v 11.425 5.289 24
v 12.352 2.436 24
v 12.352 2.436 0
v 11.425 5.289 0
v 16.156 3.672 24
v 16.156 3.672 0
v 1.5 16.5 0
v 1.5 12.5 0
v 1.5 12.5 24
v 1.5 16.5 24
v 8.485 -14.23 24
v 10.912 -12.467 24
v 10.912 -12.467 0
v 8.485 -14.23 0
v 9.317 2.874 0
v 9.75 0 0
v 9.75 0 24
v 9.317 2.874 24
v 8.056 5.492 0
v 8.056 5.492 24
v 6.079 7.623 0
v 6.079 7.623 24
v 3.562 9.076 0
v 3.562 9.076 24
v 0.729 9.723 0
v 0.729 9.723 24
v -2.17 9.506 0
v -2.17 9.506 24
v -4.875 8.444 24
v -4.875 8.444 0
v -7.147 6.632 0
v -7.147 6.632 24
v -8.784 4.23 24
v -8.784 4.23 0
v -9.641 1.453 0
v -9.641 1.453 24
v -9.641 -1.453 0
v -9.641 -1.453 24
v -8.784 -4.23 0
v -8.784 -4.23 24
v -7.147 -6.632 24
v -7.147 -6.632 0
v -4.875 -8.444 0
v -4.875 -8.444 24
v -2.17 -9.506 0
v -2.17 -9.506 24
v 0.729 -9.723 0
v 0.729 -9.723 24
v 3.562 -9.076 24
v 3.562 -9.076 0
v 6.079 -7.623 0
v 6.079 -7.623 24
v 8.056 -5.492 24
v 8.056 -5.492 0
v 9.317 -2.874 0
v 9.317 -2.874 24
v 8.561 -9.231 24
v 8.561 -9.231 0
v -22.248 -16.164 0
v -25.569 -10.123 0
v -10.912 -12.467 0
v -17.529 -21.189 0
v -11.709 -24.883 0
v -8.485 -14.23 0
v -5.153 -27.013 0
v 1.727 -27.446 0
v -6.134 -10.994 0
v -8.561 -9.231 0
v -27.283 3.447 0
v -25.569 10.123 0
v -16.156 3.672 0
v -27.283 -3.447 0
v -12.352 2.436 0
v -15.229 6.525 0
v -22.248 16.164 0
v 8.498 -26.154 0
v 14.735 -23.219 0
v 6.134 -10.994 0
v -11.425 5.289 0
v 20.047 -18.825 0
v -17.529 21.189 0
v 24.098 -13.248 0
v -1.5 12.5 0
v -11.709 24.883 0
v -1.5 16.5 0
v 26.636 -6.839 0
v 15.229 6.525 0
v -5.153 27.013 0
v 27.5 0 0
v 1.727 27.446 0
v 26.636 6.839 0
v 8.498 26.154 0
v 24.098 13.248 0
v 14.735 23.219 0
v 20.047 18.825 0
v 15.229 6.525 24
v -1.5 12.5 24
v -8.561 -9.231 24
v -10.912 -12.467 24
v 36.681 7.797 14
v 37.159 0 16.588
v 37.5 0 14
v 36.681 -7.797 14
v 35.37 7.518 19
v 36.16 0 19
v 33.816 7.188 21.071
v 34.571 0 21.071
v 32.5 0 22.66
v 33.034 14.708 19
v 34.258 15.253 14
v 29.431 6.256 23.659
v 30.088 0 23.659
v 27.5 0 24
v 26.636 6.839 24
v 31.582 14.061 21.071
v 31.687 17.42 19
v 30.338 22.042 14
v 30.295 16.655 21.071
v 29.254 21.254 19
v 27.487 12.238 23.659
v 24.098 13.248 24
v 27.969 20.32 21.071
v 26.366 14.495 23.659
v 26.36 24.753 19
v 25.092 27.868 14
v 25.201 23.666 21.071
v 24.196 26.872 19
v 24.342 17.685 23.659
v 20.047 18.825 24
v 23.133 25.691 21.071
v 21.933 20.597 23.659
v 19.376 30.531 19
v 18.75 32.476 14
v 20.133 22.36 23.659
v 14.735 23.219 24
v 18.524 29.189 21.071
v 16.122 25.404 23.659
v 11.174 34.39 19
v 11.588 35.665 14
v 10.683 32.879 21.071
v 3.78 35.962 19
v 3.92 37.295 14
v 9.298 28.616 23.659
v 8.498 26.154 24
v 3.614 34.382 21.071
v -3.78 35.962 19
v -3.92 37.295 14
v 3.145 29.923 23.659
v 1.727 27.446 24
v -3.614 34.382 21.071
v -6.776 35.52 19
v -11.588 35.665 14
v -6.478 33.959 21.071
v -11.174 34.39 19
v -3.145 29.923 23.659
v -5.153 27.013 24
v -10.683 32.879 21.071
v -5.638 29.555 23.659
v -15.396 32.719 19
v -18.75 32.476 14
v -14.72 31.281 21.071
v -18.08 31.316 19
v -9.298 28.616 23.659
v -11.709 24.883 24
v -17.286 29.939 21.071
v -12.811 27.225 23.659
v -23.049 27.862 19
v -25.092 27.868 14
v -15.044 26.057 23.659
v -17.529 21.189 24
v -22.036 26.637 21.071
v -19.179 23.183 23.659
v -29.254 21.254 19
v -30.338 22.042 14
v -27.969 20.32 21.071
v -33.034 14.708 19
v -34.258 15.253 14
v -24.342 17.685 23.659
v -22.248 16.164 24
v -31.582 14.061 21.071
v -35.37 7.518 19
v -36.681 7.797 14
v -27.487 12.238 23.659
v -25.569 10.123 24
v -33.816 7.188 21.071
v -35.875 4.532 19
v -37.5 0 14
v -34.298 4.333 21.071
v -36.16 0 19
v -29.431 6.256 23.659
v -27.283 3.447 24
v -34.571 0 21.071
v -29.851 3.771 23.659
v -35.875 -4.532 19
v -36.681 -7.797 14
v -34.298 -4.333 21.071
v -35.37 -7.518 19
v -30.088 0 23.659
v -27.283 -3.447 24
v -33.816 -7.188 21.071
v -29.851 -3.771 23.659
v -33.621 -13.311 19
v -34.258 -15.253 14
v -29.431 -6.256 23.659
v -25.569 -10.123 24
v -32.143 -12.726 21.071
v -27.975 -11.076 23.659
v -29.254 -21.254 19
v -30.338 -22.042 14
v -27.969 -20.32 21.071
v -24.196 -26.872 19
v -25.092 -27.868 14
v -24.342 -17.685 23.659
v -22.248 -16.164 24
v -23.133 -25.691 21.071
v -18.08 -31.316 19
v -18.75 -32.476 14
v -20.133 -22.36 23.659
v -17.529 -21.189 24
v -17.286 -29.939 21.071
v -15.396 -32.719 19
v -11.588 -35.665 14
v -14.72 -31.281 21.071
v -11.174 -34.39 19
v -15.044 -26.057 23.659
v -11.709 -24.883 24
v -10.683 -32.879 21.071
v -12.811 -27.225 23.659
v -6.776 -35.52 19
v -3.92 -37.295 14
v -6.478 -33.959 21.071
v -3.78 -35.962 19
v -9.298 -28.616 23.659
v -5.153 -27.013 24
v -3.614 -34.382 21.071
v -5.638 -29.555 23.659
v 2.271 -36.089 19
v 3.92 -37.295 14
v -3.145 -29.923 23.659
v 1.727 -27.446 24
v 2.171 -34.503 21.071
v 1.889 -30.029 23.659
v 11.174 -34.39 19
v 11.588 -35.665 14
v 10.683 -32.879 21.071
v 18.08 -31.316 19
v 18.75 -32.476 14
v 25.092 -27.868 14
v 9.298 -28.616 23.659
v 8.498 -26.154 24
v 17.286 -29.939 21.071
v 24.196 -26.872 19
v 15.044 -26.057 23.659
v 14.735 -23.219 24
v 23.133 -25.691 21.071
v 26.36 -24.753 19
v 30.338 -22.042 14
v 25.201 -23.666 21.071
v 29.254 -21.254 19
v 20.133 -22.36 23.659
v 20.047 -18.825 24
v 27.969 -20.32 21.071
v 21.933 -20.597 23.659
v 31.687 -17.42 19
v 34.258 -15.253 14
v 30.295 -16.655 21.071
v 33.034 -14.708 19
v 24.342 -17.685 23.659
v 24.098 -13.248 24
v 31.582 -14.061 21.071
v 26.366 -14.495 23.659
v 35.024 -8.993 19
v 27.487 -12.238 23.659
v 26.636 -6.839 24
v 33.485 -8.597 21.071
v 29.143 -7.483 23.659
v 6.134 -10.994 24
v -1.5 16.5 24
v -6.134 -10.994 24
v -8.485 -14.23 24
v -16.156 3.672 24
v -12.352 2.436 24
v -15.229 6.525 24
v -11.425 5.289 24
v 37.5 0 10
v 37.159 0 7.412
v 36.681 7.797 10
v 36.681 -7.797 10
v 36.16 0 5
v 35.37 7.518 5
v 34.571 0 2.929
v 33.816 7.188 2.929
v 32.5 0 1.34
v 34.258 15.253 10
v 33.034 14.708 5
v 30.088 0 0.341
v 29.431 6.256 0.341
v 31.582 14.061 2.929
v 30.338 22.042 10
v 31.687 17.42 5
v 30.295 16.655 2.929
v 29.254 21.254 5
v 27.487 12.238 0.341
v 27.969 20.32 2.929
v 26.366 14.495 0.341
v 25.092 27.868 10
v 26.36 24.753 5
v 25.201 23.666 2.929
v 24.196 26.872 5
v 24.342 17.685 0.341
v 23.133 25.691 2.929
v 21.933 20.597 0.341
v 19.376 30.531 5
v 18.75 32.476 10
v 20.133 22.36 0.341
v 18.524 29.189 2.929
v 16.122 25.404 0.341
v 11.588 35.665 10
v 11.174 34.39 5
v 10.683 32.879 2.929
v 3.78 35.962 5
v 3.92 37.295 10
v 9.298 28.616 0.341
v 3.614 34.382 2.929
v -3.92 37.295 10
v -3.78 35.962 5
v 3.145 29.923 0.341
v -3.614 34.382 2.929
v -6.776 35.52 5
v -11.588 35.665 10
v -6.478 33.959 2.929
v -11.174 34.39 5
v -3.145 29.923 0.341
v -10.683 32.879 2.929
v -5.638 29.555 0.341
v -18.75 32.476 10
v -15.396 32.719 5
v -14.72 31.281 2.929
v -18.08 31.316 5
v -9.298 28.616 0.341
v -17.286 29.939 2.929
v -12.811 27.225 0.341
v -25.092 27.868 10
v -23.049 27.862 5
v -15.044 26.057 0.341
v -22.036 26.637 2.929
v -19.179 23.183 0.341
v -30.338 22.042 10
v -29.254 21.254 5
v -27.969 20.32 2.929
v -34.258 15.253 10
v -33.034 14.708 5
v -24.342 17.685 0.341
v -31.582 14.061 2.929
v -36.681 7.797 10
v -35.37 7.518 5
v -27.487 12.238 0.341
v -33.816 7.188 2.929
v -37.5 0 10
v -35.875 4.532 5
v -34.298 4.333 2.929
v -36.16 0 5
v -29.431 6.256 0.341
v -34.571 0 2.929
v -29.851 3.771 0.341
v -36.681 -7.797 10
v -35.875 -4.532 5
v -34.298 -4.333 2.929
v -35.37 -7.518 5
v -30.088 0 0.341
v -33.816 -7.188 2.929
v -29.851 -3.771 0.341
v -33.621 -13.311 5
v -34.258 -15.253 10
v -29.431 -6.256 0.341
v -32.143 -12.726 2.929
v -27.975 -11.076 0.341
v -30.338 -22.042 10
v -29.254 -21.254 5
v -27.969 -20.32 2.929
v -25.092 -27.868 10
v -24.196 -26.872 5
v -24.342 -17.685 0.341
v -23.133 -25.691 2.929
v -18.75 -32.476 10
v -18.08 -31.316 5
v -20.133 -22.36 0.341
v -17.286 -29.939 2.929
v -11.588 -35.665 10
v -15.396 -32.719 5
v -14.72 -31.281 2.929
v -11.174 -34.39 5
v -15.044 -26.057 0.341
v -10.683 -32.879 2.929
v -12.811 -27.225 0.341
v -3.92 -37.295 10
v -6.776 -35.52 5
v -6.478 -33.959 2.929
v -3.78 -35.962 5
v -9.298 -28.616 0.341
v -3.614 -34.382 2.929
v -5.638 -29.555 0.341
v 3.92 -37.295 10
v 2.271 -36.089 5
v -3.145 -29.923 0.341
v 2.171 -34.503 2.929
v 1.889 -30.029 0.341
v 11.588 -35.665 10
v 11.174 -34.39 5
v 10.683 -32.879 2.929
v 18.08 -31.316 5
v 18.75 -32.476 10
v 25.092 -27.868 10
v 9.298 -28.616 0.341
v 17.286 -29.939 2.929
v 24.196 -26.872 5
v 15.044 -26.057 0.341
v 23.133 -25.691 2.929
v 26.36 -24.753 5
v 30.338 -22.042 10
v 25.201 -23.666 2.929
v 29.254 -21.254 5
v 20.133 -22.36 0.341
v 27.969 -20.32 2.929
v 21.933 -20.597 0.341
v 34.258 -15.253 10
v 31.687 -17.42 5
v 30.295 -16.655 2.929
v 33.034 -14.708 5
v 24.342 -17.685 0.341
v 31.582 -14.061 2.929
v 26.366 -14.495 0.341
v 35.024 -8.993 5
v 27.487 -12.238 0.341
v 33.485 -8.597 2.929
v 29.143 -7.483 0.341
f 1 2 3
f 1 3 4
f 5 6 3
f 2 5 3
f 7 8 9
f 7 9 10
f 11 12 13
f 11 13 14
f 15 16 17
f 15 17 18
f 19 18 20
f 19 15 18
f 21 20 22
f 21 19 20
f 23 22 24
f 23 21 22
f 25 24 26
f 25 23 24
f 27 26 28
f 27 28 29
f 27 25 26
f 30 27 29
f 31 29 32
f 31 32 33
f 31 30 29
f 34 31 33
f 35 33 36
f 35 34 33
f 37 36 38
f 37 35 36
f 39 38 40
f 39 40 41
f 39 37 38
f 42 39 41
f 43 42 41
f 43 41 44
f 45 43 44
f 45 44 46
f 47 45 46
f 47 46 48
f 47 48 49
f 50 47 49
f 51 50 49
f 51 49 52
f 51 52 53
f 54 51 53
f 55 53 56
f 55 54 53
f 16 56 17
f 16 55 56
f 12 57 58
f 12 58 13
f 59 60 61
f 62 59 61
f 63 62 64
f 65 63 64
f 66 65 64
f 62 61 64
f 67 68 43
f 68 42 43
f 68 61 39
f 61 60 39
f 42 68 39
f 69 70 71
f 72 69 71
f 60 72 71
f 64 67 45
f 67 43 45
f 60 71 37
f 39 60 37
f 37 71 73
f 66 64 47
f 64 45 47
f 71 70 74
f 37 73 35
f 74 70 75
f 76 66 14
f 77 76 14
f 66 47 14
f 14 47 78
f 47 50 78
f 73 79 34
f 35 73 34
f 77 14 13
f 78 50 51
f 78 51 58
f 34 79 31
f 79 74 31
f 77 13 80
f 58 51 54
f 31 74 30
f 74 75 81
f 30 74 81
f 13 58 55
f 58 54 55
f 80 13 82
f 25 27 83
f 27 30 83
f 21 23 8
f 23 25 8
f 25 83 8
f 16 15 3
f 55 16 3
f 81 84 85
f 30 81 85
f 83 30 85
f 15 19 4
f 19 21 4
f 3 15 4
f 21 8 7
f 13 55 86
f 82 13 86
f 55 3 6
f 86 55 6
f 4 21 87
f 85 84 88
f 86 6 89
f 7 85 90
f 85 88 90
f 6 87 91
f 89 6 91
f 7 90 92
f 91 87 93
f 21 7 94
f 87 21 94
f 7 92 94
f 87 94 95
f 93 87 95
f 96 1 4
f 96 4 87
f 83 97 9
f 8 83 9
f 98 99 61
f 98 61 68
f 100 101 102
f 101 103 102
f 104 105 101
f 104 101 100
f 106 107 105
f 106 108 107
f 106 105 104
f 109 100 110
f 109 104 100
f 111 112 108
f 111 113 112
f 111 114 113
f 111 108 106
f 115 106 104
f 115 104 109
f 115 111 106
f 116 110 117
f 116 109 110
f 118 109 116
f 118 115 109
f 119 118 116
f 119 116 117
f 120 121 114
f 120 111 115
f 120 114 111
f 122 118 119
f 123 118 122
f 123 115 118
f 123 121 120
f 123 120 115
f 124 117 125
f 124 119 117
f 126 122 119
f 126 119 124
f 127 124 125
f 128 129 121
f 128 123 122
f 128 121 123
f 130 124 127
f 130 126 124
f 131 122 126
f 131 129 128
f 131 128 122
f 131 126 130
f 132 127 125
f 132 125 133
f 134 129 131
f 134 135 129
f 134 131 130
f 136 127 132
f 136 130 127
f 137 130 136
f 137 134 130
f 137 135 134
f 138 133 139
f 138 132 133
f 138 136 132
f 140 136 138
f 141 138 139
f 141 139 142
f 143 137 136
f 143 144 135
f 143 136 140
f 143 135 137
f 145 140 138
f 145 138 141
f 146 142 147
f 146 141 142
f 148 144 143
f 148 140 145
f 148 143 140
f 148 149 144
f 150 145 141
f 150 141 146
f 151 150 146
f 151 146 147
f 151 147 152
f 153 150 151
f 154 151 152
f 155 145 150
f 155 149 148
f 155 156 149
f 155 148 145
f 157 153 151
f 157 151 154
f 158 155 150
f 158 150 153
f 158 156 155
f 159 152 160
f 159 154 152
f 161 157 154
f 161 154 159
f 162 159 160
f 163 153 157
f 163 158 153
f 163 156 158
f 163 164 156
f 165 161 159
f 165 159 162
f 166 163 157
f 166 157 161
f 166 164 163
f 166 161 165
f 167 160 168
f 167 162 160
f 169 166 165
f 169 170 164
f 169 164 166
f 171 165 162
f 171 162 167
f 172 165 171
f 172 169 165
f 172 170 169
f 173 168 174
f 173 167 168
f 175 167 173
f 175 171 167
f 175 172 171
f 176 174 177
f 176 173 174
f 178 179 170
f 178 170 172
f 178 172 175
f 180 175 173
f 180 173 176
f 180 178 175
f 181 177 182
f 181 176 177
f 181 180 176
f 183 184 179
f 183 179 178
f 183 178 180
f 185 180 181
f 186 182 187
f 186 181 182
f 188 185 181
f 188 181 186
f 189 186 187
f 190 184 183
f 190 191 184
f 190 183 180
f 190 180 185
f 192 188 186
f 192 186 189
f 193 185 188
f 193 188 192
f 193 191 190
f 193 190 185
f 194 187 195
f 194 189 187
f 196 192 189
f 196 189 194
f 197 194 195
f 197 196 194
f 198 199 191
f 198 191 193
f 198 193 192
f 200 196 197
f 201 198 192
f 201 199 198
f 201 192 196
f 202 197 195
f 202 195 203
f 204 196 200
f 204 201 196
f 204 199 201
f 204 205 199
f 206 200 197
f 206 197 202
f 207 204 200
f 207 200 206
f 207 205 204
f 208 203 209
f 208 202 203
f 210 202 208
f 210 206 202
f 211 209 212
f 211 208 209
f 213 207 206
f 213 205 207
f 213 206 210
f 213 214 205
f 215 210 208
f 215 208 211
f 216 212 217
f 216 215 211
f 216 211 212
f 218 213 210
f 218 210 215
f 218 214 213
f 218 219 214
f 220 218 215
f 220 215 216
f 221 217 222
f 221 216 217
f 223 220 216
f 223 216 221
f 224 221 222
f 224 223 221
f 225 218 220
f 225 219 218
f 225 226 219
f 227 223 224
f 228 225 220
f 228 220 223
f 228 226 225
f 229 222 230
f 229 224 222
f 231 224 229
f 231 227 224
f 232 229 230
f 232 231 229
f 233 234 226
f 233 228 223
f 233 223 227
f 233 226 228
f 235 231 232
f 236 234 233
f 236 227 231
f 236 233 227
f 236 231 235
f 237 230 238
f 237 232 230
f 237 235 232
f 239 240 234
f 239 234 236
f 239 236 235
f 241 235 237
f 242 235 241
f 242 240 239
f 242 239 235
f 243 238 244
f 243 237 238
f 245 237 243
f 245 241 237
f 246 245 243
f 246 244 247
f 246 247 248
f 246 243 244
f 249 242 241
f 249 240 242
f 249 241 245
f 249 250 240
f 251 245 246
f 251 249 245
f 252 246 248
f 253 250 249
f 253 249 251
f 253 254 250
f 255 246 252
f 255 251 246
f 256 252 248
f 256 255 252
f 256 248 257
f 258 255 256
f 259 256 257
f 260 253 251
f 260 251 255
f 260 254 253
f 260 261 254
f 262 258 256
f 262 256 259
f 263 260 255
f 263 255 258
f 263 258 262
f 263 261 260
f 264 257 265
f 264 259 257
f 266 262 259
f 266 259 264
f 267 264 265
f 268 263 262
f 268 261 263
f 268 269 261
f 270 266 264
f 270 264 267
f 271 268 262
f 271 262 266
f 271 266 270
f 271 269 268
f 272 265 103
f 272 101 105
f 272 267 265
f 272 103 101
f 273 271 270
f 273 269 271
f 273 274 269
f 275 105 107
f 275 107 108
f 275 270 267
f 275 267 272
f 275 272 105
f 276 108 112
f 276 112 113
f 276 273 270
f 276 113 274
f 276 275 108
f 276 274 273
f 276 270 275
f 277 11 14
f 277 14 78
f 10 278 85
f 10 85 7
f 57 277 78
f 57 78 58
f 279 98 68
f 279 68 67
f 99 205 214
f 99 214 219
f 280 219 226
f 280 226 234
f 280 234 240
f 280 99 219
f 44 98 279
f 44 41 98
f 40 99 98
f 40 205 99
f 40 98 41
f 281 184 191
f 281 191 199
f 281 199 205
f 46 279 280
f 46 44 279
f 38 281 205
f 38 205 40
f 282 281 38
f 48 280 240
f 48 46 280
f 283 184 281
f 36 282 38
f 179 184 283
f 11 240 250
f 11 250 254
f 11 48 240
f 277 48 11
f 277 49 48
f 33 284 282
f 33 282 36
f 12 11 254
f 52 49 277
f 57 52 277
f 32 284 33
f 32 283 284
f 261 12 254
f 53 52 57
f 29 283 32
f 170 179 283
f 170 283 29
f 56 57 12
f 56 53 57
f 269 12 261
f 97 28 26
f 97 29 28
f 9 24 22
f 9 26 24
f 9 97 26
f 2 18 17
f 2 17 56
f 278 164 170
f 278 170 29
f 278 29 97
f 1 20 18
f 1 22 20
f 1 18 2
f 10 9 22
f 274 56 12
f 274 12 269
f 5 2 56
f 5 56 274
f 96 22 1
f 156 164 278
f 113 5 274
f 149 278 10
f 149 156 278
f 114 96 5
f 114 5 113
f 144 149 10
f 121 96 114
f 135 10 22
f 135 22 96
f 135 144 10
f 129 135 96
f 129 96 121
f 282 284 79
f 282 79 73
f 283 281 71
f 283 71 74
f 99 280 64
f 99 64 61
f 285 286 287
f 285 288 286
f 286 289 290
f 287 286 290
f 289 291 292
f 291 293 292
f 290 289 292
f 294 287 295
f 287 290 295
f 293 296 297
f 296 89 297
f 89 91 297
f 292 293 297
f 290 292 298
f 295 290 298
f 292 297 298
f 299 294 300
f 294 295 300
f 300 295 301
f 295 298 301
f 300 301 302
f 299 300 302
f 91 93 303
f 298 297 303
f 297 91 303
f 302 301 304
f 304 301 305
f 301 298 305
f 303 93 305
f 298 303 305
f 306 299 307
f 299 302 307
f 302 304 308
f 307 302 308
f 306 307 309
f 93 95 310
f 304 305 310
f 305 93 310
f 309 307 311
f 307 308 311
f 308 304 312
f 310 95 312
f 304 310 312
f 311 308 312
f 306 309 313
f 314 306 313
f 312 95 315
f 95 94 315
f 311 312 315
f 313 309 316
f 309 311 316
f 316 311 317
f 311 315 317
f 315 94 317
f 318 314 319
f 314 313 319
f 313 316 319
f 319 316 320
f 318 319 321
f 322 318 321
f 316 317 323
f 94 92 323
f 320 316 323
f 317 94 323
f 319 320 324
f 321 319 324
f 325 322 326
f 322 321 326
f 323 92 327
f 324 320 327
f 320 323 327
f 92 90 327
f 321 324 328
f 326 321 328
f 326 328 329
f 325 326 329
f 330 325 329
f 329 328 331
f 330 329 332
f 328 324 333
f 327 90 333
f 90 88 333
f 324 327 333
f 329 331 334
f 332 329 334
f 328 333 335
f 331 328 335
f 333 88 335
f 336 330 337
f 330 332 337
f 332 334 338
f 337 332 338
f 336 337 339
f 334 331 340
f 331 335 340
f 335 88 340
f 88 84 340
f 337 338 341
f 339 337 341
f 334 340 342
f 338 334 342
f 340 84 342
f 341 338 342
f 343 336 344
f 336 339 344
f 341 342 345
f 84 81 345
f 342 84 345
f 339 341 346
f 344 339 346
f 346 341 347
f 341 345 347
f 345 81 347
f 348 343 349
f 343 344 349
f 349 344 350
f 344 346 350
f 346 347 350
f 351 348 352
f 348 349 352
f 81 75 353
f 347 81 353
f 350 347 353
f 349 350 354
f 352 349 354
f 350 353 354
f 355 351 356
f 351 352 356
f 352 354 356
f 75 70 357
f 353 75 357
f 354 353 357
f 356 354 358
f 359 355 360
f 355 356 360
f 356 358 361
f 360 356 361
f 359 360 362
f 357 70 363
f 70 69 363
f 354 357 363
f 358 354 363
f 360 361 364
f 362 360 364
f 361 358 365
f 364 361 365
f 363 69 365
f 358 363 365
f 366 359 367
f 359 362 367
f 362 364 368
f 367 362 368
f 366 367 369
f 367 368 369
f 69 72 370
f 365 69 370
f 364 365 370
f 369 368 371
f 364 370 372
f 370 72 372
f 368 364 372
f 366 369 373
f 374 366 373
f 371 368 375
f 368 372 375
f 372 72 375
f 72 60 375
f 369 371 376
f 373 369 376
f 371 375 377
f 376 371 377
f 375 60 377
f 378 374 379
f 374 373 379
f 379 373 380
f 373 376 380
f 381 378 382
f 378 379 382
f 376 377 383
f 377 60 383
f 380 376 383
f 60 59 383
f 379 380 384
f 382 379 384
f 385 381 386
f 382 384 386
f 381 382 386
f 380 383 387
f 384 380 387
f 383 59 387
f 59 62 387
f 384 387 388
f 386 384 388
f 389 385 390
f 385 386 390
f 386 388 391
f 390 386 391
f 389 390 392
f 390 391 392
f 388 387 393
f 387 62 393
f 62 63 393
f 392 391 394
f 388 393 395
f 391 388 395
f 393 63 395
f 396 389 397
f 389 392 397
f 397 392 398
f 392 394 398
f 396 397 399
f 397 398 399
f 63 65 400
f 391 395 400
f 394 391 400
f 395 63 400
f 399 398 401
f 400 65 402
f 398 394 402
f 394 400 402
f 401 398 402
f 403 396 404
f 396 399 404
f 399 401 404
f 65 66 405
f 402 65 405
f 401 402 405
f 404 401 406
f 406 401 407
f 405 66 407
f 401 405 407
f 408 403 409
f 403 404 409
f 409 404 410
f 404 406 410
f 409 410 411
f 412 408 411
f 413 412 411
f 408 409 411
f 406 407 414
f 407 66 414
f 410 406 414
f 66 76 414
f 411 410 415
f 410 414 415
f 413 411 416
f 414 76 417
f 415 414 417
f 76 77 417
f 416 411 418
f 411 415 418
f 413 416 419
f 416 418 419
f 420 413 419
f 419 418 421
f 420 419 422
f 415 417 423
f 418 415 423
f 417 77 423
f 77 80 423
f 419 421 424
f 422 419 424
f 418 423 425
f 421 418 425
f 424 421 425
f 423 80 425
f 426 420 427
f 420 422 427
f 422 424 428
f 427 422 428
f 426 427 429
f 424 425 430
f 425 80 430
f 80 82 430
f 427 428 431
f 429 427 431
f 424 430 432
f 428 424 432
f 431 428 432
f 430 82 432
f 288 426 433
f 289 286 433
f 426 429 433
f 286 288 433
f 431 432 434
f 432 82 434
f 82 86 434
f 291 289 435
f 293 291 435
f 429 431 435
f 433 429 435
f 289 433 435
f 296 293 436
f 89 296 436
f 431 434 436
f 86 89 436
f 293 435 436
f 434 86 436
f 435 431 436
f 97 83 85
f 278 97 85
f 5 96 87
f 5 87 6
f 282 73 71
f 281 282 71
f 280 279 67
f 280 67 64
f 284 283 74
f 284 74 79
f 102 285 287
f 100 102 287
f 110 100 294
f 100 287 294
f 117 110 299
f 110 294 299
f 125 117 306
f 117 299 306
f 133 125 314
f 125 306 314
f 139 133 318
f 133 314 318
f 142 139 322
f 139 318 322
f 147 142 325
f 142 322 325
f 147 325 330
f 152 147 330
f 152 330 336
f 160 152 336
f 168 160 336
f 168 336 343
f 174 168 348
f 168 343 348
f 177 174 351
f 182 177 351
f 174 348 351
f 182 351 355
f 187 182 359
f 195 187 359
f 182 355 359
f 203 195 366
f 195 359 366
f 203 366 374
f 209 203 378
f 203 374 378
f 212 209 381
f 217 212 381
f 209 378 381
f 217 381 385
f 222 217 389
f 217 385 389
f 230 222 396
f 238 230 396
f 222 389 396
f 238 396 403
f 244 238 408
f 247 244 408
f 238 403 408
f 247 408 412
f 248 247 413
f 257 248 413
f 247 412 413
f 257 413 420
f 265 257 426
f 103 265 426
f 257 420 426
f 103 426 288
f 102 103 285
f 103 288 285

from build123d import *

# Parameters (mm, degrees)
ESQUISSE1_R             = 37.5
ESQUISSE1_R_2           = 9.75
BOSS_EXTRU_1_DEPTH      = 24
CONG_1_R                = 10
ESQUISSE3_W             = 3
ESQUISSE3_H             = 4
ENL_V_MAT_EXTRU_1_DEPTH = 59.210823736


with BuildPart() as part:
    # Esquisse1 → Boss.-Extru.1 (new body)
    with BuildSketch(Plane.XY):
        Circle(ESQUISSE1_R)
        Circle(ESQUISSE1_R_2, mode=Mode.SUBTRACT)
    extrude(amount=BOSS_EXTRU_1_DEPTH)

    # Congé1
    cong_1_edges = [part.edges().sort_by_distance(p)[0] for p in [
        (-37.5, 0, 0),
        (-37.5, 0, 24),
    ]]
    fillet(cong_1_edges, radius=CONG_1_R)

    # Esquisse3 → Enlèv. mat.-Extru.1 (cut, through all)
    with BuildSketch(Plane.XY.offset(24)):
        Polygon((15.228907027, 6.525365182), (16.15595801, 3.672195633), (12.351731945, 2.436127655), (11.424680962, 5.289297204), align=None)
        with Locations((0, 14.5)):
            Rectangle(ESQUISSE3_W, ESQUISSE3_H)
        Polygon((10.911982154, -12.467102529), (8.484931171, -14.230458286), (6.133790162, -10.994390308), (8.560841145, -9.231034551), align=None)
        Polygon((-8.484931171, -14.230458286), (-10.911982154, -12.467102529), (-8.560841145, -9.231034551), (-6.133790162, -10.994390308), align=None)
        Polygon((-16.15595801, 3.672195633), (-15.228907027, 6.525365182), (-11.424680962, 5.289297204), (-12.351731945, 2.436127655), align=None)
    extrude(amount=-ENL_V_MAT_EXTRU_1_DEPTH, mode=Mode.SUBTRACT)


solid = part.part
